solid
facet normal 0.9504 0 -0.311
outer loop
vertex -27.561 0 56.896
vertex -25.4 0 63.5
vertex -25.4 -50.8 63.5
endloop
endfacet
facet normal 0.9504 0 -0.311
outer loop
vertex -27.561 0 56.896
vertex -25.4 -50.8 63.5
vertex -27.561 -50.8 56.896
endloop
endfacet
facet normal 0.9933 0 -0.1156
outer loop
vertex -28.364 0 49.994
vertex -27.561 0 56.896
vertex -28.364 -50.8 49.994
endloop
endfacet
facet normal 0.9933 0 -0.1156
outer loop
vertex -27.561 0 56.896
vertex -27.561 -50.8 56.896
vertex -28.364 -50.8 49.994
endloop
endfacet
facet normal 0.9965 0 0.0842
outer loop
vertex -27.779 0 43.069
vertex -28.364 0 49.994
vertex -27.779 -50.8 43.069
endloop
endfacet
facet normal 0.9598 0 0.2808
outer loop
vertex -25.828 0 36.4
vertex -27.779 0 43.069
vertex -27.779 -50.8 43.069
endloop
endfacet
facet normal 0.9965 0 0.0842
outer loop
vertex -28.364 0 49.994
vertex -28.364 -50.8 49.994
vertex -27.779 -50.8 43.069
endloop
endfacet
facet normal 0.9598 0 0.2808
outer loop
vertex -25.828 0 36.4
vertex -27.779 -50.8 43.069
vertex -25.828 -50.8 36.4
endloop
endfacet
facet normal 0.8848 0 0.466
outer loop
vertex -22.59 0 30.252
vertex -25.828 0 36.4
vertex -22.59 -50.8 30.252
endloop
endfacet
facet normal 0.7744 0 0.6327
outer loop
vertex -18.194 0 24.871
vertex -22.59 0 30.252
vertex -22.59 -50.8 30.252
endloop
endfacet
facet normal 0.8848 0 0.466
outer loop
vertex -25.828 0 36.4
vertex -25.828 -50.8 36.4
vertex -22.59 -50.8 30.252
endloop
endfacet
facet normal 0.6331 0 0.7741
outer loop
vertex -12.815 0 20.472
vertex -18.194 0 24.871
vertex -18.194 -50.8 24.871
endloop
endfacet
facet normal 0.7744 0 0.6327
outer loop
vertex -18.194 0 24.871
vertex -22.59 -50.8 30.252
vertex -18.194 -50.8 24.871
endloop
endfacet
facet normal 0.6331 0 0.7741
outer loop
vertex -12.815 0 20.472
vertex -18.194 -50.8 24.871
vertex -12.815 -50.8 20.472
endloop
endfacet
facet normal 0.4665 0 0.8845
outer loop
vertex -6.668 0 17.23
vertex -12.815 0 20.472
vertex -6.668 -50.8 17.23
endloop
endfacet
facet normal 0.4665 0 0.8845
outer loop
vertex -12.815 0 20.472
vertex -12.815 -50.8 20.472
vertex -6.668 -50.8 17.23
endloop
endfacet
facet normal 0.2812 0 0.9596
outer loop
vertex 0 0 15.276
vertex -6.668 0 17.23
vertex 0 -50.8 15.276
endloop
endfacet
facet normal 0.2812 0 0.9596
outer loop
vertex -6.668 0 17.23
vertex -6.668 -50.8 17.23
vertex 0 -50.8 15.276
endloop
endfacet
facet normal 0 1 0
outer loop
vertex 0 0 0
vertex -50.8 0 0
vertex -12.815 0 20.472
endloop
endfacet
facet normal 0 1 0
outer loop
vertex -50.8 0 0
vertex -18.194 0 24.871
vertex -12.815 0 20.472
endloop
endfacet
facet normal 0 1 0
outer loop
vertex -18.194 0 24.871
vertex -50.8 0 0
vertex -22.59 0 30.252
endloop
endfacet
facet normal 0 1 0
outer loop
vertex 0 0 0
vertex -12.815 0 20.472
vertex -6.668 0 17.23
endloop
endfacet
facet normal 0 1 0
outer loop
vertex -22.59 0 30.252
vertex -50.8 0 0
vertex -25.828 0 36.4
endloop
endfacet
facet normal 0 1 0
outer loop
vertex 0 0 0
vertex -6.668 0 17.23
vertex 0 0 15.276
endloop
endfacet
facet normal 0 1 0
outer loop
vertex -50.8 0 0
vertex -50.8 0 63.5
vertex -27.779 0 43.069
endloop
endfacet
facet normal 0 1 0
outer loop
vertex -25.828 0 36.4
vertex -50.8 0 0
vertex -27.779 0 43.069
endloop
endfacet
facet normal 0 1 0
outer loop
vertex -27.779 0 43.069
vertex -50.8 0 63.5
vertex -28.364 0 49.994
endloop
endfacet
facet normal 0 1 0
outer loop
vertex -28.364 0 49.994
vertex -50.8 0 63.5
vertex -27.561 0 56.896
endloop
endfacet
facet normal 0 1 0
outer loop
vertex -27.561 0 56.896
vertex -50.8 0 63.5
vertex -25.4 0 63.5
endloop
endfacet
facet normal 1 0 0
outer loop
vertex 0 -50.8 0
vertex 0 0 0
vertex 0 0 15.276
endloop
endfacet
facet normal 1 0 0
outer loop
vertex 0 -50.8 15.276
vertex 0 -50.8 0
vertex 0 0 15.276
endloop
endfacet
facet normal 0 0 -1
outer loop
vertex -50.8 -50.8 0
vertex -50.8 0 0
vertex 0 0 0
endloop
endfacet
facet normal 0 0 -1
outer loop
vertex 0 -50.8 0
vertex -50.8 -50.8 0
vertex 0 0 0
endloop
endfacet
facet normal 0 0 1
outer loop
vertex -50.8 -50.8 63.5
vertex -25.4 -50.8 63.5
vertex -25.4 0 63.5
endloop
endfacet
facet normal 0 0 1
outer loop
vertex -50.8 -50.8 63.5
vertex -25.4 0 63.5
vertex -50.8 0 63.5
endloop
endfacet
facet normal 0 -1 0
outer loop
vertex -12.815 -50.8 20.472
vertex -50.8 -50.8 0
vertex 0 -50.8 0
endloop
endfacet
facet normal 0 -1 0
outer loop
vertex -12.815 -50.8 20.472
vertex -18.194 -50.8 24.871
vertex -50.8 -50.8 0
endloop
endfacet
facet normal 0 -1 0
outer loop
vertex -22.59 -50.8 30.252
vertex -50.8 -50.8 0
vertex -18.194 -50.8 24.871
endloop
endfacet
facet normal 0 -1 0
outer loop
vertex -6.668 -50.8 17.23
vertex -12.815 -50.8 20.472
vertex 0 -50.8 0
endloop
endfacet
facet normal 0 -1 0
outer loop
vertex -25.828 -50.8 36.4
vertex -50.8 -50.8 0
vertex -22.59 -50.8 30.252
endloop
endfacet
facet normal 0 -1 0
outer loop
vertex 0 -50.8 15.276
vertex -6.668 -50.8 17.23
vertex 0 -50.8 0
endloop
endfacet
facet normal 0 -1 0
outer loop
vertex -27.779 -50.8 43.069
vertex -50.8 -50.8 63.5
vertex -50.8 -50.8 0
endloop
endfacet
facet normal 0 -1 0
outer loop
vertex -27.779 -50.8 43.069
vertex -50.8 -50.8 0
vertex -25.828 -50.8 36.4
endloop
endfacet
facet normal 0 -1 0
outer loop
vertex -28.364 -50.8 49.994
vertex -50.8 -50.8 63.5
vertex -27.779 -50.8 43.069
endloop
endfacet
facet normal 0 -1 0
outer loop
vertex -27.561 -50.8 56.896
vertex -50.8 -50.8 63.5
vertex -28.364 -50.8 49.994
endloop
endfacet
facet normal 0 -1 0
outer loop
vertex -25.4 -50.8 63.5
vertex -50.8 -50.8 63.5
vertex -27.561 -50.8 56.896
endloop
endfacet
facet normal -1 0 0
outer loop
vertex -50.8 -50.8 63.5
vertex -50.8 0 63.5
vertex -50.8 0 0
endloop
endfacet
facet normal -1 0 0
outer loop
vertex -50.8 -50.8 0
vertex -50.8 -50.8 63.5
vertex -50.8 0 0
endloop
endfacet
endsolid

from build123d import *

# Parameters (mm, degrees)
F1_DEPTH = 50.8
F3_DEPTH = 50.8


with BuildPart() as f1:
    # F0 (on Front) → F1 (new body)
    with BuildSketch(Plane.XZ):
        Polygon((-50.8, 0), (0, 0), (0, 38.1), (-25.4, 38.1), (-25.4, 63.5), (-50.8, 63.5), align=None)
    extrude(amount=F1_DEPTH)

    # F2 (on face) → F3 (cut)
    with BuildSketch(Plane.XZ.offset(50.8)):
        with BuildLine():
            Line((-25.4, 38.1), (-25.4, 63.5))
            ThreePointArc((-25.4, 63.5), (-24.36322, 33.245019), (0, 15.276372))
            Line((0, 15.276372), (0, 38.1))
            Line((0, 38.1), (-25.4, 38.1))
        make_face()
    extrude(amount=-F3_DEPTH, mode=Mode.SUBTRACT)


solid = f1.part
